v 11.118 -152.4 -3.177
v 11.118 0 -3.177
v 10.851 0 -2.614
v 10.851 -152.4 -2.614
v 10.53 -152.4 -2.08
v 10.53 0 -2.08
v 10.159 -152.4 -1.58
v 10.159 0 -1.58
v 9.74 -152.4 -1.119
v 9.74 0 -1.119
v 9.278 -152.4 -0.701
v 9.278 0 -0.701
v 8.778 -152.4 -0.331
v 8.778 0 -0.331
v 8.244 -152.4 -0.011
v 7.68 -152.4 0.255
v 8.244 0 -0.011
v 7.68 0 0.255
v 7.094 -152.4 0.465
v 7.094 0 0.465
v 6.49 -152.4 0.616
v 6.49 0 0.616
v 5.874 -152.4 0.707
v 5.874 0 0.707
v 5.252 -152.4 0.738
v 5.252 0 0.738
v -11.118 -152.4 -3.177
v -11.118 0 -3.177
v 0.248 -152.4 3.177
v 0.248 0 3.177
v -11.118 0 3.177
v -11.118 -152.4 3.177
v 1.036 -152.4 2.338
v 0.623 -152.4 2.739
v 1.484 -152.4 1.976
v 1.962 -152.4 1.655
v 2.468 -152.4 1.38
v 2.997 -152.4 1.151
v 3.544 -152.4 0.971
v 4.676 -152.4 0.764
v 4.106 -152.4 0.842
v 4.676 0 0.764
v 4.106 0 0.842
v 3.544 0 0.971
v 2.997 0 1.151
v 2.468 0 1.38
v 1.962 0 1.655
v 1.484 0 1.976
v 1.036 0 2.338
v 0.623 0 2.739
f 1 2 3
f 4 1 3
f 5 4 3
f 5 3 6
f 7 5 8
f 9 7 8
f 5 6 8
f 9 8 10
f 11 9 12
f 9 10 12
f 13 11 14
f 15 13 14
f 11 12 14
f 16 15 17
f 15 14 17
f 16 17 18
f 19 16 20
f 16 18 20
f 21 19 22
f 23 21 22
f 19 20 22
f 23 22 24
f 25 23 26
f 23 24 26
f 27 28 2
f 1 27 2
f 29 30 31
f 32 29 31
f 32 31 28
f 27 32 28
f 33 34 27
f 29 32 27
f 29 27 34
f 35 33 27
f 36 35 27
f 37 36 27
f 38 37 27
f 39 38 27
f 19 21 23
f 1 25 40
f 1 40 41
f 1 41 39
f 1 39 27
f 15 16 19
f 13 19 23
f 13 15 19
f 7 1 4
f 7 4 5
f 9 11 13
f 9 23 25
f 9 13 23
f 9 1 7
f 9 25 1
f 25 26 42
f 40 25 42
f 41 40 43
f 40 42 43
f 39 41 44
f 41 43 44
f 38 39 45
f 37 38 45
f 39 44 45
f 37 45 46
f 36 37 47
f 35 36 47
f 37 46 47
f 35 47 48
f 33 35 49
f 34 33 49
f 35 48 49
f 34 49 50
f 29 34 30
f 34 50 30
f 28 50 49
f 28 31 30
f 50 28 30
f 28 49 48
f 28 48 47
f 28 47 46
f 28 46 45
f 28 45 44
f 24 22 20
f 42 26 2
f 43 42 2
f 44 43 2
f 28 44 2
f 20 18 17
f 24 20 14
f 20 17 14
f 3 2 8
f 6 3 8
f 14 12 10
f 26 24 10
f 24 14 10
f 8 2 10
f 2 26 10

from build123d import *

# Parameters (mm, degrees)
F1_DEPTH = 152.4


# Not quite as in the source:
# - ends of sketch curves that miss each other by under 0.0002 mm in the source are joined


with BuildPart() as f1:
    # F0 (on Front) → F1 (new body)
    with BuildSketch(Plane.XZ):
        with BuildLine():
            Line((0.247523, 3.176651), (-11.1182404, 3.176651))
            Line((-11.1182404, 3.176651), (-11.1182404, -3.1766256))
            Line((-11.1182404, -3.1766256), (11.1182404, -3.1766256))
            ThreePointArc((11.1182404, -3.1766256), (8.7779959458, -0.3307242374), (5.2517548, 0.7376922))
            ThreePointArc((5.2517548, 0.7376922), (2.4682848878, 1.3798901975), (0.247523, 3.176651))
        make_face()
    extrude(amount=F1_DEPTH)


solid = f1.part
